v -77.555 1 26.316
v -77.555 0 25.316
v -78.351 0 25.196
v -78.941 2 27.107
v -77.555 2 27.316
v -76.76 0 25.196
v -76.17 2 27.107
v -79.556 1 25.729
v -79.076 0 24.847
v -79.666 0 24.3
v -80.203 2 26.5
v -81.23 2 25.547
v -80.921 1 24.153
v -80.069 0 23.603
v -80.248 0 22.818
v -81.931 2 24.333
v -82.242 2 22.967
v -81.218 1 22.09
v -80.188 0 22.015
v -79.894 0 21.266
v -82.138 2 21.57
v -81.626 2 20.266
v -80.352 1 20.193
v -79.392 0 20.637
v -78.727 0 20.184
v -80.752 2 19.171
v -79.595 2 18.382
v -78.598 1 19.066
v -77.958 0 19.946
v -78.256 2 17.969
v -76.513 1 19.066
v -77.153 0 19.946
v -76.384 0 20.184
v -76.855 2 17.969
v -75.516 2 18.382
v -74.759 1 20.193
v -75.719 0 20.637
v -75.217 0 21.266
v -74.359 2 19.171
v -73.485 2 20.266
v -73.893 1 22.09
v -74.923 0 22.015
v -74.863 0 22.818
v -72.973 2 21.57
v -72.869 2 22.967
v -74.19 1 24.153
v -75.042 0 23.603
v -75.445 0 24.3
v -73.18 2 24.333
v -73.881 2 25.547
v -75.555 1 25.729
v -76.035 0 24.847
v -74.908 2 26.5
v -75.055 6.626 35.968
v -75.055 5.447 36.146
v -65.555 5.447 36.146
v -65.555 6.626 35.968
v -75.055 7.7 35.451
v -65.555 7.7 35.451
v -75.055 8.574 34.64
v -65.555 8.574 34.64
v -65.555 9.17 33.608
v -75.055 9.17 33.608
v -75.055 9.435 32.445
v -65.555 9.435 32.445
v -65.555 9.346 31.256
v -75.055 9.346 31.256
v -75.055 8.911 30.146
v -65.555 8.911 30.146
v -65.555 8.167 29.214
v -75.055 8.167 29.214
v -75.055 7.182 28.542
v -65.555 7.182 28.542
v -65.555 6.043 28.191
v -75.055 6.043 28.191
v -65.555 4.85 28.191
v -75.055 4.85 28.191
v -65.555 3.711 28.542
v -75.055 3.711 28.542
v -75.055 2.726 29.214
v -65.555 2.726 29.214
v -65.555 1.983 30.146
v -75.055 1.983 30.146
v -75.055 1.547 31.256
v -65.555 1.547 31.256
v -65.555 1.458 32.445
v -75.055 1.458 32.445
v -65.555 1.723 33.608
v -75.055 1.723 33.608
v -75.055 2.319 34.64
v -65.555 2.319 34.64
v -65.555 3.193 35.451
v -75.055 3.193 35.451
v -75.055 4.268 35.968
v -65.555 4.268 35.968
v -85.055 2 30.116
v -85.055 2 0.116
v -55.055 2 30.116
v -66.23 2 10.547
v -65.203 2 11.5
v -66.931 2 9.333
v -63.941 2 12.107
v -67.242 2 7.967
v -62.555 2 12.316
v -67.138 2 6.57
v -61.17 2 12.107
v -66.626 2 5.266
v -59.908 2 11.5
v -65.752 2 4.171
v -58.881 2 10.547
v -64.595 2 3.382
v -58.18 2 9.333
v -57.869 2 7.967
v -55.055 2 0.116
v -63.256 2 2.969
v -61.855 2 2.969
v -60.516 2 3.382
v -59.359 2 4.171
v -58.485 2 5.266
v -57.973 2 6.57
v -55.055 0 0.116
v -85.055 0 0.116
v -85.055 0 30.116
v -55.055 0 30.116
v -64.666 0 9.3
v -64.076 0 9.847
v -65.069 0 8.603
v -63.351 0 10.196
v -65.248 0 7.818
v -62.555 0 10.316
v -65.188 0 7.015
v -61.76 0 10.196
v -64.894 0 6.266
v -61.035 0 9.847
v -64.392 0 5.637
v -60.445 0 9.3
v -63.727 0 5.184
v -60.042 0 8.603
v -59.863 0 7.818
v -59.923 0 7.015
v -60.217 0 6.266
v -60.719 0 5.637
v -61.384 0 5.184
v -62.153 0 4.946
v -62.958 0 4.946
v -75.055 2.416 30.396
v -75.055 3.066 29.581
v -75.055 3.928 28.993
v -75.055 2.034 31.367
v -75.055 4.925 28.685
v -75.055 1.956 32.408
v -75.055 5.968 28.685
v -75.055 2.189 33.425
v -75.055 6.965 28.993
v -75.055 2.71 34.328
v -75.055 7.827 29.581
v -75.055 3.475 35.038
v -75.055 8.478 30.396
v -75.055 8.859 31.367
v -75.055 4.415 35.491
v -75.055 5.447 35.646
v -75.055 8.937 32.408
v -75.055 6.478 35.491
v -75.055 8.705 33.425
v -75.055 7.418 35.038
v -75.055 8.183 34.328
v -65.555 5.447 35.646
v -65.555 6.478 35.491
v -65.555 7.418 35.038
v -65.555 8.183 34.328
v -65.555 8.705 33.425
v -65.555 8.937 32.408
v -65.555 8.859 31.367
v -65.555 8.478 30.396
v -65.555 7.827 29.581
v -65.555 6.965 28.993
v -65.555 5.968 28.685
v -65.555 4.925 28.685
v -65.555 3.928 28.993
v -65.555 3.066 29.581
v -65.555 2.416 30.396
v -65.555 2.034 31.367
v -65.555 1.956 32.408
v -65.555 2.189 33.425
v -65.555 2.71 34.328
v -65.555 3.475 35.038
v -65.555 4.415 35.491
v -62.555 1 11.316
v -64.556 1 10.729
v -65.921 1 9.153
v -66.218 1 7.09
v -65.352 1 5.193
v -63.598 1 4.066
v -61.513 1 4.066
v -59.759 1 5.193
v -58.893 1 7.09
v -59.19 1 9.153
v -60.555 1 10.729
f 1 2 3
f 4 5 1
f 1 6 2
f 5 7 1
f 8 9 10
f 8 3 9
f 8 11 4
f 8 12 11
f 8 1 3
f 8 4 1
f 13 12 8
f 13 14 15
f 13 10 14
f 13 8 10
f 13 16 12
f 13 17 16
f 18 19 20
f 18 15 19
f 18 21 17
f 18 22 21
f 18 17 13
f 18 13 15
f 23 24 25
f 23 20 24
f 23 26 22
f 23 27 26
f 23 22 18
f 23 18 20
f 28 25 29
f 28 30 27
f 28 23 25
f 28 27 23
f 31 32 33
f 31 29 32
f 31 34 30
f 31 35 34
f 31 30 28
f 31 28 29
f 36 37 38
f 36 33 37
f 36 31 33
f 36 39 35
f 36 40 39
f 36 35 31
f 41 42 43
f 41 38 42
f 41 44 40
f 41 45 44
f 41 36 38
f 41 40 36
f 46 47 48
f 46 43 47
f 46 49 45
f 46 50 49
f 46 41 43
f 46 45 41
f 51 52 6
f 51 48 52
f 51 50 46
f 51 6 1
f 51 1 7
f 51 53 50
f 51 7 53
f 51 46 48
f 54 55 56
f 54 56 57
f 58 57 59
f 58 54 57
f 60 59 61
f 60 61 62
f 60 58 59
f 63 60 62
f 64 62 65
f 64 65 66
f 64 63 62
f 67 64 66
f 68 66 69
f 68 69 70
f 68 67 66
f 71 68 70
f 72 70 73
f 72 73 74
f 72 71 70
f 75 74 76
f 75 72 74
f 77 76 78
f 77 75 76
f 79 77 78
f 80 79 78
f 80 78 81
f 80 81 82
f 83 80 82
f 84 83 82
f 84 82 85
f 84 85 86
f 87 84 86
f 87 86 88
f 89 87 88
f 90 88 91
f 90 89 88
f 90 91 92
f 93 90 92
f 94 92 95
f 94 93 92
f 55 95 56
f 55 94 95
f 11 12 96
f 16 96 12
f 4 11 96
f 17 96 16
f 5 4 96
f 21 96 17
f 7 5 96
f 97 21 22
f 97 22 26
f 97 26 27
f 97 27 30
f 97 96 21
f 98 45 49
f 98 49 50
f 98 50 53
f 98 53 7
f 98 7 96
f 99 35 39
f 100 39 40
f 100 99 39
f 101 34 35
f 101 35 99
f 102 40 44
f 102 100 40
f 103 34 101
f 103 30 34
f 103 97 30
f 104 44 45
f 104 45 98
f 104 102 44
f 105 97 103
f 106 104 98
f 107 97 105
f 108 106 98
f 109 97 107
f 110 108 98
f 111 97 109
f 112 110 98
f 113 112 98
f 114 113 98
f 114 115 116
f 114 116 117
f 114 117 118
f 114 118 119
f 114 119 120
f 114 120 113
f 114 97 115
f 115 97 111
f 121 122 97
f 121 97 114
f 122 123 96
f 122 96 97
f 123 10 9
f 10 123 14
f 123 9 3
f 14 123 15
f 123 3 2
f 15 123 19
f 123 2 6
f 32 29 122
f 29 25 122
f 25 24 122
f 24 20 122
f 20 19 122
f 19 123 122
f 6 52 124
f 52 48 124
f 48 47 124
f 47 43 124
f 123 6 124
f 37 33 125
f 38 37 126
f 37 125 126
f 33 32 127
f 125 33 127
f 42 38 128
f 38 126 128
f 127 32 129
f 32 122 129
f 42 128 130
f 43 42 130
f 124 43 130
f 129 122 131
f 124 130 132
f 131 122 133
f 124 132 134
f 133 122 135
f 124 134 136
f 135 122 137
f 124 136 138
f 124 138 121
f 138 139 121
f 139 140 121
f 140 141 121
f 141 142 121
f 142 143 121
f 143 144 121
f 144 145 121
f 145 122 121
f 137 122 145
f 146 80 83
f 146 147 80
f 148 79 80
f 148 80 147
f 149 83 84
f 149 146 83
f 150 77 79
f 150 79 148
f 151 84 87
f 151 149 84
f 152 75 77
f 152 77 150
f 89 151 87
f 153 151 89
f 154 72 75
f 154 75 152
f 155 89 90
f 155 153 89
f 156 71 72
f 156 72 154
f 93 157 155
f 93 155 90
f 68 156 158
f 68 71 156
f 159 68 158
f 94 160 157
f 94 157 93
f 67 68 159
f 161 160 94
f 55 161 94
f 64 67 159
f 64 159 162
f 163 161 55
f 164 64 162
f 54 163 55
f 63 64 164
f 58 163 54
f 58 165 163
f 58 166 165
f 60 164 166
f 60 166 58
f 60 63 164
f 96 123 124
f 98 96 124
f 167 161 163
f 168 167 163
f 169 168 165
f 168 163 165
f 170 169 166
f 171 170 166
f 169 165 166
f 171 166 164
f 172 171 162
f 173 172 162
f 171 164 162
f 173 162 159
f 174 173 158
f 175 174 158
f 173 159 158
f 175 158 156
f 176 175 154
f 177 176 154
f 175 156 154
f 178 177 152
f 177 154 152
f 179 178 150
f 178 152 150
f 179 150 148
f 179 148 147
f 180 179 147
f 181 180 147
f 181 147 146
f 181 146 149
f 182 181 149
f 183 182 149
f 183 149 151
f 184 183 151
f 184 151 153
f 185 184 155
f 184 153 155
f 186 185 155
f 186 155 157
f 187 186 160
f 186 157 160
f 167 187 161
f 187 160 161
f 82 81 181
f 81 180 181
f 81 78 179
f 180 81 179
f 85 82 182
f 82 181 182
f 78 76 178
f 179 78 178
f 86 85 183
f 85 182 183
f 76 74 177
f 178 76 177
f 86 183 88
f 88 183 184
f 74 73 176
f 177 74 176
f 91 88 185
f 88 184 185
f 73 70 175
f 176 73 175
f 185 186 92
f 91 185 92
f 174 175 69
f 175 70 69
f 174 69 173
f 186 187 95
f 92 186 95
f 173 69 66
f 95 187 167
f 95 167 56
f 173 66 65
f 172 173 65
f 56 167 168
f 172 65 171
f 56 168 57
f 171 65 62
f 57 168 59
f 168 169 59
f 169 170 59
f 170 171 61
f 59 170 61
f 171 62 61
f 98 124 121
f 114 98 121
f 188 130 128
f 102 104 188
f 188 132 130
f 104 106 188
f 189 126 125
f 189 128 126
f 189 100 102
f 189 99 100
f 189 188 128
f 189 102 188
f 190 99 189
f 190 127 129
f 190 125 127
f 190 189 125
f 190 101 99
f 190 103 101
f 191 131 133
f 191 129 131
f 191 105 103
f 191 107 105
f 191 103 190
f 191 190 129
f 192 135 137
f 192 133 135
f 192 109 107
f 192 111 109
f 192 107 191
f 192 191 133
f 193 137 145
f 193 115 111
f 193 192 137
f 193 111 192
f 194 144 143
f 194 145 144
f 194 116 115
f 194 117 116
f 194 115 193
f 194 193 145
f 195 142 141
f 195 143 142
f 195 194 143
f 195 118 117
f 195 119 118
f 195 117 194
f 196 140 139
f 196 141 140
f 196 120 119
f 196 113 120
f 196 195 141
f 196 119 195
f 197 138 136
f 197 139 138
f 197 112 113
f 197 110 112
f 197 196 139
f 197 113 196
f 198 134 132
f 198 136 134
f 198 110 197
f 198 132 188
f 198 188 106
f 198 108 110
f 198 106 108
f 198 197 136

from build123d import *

# Parameters (mm, degrees)
SKETCH_1_W                 = 30
SKETCH_1_H                 = 30
EXTRUDE_1_DEPTH            = 2
SKETCH_2_R                 = 4
SKETCH_2_R_2               = 3.5
EXTRUDE_2_DEPTH            = 9.5
HOLE_WIZARD_M41_AT_2_COUNT = 2
HOLE_WIZARD_M41_AT_2_PITCH = 21.213203436


with BuildPart() as part:
    # Эскиз1 → Бобышка-Вытянуть1 (new body)
    with BuildSketch(Plane(origin=(0, 0, 0), x_dir=(1, 0, 0), z_dir=(0, 1, 0))):
        with Locations((-70.055498839, -15.11620678)):
            Rectangle(SKETCH_1_W, SKETCH_1_H)
    extrude(amount=EXTRUDE_1_DEPTH)

    # Эскиз4 → Зенковка для  винта с плоской головкой M41 (revolve, cut)
    with BuildSketch(Plane(origin=(-77.555498839, 2, 22.61620678), x_dir=(0, 0, 1), z_dir=(1, 0, 0))):
        Polygon((0, 0), (0, 22.351936393), (2.25, 21), (2.25, 2.45), (4.7, 0), align=None)
    hole_wizard_m41 = revolve(axis=Axis((-77.555498839, 8.35, 22.61620678), (0, -1, 0)), mode=Mode.SUBTRACT)

    # Зенковка для  винта с плоской головкой M41 at 2: Зенковка для  винта с плоской головкой M41 ×2
    with Locations(*[Vector(0.7071067811865479, 0, -0.7071067811865472) * (i * HOLE_WIZARD_M41_AT_2_PITCH) for i in range(1, HOLE_WIZARD_M41_AT_2_COUNT)]):
        add(hole_wizard_m41, mode=Mode.SUBTRACT)


with BuildPart() as body_2:
    # Эскиз2 → Бобышка-Вытянуть2 (new body)
    with BuildSketch(Plane.ZY.offset(75.055498839)):
        with Locations((32.14620678, 5.446607027)):
            Circle(SKETCH_2_R)
        with Locations((32.14620678, 5.446607027)):
            Circle(SKETCH_2_R_2, mode=Mode.SUBTRACT)
    extrude(amount=-EXTRUDE_2_DEPTH)


solid = Compound([part.part, body_2.part])
